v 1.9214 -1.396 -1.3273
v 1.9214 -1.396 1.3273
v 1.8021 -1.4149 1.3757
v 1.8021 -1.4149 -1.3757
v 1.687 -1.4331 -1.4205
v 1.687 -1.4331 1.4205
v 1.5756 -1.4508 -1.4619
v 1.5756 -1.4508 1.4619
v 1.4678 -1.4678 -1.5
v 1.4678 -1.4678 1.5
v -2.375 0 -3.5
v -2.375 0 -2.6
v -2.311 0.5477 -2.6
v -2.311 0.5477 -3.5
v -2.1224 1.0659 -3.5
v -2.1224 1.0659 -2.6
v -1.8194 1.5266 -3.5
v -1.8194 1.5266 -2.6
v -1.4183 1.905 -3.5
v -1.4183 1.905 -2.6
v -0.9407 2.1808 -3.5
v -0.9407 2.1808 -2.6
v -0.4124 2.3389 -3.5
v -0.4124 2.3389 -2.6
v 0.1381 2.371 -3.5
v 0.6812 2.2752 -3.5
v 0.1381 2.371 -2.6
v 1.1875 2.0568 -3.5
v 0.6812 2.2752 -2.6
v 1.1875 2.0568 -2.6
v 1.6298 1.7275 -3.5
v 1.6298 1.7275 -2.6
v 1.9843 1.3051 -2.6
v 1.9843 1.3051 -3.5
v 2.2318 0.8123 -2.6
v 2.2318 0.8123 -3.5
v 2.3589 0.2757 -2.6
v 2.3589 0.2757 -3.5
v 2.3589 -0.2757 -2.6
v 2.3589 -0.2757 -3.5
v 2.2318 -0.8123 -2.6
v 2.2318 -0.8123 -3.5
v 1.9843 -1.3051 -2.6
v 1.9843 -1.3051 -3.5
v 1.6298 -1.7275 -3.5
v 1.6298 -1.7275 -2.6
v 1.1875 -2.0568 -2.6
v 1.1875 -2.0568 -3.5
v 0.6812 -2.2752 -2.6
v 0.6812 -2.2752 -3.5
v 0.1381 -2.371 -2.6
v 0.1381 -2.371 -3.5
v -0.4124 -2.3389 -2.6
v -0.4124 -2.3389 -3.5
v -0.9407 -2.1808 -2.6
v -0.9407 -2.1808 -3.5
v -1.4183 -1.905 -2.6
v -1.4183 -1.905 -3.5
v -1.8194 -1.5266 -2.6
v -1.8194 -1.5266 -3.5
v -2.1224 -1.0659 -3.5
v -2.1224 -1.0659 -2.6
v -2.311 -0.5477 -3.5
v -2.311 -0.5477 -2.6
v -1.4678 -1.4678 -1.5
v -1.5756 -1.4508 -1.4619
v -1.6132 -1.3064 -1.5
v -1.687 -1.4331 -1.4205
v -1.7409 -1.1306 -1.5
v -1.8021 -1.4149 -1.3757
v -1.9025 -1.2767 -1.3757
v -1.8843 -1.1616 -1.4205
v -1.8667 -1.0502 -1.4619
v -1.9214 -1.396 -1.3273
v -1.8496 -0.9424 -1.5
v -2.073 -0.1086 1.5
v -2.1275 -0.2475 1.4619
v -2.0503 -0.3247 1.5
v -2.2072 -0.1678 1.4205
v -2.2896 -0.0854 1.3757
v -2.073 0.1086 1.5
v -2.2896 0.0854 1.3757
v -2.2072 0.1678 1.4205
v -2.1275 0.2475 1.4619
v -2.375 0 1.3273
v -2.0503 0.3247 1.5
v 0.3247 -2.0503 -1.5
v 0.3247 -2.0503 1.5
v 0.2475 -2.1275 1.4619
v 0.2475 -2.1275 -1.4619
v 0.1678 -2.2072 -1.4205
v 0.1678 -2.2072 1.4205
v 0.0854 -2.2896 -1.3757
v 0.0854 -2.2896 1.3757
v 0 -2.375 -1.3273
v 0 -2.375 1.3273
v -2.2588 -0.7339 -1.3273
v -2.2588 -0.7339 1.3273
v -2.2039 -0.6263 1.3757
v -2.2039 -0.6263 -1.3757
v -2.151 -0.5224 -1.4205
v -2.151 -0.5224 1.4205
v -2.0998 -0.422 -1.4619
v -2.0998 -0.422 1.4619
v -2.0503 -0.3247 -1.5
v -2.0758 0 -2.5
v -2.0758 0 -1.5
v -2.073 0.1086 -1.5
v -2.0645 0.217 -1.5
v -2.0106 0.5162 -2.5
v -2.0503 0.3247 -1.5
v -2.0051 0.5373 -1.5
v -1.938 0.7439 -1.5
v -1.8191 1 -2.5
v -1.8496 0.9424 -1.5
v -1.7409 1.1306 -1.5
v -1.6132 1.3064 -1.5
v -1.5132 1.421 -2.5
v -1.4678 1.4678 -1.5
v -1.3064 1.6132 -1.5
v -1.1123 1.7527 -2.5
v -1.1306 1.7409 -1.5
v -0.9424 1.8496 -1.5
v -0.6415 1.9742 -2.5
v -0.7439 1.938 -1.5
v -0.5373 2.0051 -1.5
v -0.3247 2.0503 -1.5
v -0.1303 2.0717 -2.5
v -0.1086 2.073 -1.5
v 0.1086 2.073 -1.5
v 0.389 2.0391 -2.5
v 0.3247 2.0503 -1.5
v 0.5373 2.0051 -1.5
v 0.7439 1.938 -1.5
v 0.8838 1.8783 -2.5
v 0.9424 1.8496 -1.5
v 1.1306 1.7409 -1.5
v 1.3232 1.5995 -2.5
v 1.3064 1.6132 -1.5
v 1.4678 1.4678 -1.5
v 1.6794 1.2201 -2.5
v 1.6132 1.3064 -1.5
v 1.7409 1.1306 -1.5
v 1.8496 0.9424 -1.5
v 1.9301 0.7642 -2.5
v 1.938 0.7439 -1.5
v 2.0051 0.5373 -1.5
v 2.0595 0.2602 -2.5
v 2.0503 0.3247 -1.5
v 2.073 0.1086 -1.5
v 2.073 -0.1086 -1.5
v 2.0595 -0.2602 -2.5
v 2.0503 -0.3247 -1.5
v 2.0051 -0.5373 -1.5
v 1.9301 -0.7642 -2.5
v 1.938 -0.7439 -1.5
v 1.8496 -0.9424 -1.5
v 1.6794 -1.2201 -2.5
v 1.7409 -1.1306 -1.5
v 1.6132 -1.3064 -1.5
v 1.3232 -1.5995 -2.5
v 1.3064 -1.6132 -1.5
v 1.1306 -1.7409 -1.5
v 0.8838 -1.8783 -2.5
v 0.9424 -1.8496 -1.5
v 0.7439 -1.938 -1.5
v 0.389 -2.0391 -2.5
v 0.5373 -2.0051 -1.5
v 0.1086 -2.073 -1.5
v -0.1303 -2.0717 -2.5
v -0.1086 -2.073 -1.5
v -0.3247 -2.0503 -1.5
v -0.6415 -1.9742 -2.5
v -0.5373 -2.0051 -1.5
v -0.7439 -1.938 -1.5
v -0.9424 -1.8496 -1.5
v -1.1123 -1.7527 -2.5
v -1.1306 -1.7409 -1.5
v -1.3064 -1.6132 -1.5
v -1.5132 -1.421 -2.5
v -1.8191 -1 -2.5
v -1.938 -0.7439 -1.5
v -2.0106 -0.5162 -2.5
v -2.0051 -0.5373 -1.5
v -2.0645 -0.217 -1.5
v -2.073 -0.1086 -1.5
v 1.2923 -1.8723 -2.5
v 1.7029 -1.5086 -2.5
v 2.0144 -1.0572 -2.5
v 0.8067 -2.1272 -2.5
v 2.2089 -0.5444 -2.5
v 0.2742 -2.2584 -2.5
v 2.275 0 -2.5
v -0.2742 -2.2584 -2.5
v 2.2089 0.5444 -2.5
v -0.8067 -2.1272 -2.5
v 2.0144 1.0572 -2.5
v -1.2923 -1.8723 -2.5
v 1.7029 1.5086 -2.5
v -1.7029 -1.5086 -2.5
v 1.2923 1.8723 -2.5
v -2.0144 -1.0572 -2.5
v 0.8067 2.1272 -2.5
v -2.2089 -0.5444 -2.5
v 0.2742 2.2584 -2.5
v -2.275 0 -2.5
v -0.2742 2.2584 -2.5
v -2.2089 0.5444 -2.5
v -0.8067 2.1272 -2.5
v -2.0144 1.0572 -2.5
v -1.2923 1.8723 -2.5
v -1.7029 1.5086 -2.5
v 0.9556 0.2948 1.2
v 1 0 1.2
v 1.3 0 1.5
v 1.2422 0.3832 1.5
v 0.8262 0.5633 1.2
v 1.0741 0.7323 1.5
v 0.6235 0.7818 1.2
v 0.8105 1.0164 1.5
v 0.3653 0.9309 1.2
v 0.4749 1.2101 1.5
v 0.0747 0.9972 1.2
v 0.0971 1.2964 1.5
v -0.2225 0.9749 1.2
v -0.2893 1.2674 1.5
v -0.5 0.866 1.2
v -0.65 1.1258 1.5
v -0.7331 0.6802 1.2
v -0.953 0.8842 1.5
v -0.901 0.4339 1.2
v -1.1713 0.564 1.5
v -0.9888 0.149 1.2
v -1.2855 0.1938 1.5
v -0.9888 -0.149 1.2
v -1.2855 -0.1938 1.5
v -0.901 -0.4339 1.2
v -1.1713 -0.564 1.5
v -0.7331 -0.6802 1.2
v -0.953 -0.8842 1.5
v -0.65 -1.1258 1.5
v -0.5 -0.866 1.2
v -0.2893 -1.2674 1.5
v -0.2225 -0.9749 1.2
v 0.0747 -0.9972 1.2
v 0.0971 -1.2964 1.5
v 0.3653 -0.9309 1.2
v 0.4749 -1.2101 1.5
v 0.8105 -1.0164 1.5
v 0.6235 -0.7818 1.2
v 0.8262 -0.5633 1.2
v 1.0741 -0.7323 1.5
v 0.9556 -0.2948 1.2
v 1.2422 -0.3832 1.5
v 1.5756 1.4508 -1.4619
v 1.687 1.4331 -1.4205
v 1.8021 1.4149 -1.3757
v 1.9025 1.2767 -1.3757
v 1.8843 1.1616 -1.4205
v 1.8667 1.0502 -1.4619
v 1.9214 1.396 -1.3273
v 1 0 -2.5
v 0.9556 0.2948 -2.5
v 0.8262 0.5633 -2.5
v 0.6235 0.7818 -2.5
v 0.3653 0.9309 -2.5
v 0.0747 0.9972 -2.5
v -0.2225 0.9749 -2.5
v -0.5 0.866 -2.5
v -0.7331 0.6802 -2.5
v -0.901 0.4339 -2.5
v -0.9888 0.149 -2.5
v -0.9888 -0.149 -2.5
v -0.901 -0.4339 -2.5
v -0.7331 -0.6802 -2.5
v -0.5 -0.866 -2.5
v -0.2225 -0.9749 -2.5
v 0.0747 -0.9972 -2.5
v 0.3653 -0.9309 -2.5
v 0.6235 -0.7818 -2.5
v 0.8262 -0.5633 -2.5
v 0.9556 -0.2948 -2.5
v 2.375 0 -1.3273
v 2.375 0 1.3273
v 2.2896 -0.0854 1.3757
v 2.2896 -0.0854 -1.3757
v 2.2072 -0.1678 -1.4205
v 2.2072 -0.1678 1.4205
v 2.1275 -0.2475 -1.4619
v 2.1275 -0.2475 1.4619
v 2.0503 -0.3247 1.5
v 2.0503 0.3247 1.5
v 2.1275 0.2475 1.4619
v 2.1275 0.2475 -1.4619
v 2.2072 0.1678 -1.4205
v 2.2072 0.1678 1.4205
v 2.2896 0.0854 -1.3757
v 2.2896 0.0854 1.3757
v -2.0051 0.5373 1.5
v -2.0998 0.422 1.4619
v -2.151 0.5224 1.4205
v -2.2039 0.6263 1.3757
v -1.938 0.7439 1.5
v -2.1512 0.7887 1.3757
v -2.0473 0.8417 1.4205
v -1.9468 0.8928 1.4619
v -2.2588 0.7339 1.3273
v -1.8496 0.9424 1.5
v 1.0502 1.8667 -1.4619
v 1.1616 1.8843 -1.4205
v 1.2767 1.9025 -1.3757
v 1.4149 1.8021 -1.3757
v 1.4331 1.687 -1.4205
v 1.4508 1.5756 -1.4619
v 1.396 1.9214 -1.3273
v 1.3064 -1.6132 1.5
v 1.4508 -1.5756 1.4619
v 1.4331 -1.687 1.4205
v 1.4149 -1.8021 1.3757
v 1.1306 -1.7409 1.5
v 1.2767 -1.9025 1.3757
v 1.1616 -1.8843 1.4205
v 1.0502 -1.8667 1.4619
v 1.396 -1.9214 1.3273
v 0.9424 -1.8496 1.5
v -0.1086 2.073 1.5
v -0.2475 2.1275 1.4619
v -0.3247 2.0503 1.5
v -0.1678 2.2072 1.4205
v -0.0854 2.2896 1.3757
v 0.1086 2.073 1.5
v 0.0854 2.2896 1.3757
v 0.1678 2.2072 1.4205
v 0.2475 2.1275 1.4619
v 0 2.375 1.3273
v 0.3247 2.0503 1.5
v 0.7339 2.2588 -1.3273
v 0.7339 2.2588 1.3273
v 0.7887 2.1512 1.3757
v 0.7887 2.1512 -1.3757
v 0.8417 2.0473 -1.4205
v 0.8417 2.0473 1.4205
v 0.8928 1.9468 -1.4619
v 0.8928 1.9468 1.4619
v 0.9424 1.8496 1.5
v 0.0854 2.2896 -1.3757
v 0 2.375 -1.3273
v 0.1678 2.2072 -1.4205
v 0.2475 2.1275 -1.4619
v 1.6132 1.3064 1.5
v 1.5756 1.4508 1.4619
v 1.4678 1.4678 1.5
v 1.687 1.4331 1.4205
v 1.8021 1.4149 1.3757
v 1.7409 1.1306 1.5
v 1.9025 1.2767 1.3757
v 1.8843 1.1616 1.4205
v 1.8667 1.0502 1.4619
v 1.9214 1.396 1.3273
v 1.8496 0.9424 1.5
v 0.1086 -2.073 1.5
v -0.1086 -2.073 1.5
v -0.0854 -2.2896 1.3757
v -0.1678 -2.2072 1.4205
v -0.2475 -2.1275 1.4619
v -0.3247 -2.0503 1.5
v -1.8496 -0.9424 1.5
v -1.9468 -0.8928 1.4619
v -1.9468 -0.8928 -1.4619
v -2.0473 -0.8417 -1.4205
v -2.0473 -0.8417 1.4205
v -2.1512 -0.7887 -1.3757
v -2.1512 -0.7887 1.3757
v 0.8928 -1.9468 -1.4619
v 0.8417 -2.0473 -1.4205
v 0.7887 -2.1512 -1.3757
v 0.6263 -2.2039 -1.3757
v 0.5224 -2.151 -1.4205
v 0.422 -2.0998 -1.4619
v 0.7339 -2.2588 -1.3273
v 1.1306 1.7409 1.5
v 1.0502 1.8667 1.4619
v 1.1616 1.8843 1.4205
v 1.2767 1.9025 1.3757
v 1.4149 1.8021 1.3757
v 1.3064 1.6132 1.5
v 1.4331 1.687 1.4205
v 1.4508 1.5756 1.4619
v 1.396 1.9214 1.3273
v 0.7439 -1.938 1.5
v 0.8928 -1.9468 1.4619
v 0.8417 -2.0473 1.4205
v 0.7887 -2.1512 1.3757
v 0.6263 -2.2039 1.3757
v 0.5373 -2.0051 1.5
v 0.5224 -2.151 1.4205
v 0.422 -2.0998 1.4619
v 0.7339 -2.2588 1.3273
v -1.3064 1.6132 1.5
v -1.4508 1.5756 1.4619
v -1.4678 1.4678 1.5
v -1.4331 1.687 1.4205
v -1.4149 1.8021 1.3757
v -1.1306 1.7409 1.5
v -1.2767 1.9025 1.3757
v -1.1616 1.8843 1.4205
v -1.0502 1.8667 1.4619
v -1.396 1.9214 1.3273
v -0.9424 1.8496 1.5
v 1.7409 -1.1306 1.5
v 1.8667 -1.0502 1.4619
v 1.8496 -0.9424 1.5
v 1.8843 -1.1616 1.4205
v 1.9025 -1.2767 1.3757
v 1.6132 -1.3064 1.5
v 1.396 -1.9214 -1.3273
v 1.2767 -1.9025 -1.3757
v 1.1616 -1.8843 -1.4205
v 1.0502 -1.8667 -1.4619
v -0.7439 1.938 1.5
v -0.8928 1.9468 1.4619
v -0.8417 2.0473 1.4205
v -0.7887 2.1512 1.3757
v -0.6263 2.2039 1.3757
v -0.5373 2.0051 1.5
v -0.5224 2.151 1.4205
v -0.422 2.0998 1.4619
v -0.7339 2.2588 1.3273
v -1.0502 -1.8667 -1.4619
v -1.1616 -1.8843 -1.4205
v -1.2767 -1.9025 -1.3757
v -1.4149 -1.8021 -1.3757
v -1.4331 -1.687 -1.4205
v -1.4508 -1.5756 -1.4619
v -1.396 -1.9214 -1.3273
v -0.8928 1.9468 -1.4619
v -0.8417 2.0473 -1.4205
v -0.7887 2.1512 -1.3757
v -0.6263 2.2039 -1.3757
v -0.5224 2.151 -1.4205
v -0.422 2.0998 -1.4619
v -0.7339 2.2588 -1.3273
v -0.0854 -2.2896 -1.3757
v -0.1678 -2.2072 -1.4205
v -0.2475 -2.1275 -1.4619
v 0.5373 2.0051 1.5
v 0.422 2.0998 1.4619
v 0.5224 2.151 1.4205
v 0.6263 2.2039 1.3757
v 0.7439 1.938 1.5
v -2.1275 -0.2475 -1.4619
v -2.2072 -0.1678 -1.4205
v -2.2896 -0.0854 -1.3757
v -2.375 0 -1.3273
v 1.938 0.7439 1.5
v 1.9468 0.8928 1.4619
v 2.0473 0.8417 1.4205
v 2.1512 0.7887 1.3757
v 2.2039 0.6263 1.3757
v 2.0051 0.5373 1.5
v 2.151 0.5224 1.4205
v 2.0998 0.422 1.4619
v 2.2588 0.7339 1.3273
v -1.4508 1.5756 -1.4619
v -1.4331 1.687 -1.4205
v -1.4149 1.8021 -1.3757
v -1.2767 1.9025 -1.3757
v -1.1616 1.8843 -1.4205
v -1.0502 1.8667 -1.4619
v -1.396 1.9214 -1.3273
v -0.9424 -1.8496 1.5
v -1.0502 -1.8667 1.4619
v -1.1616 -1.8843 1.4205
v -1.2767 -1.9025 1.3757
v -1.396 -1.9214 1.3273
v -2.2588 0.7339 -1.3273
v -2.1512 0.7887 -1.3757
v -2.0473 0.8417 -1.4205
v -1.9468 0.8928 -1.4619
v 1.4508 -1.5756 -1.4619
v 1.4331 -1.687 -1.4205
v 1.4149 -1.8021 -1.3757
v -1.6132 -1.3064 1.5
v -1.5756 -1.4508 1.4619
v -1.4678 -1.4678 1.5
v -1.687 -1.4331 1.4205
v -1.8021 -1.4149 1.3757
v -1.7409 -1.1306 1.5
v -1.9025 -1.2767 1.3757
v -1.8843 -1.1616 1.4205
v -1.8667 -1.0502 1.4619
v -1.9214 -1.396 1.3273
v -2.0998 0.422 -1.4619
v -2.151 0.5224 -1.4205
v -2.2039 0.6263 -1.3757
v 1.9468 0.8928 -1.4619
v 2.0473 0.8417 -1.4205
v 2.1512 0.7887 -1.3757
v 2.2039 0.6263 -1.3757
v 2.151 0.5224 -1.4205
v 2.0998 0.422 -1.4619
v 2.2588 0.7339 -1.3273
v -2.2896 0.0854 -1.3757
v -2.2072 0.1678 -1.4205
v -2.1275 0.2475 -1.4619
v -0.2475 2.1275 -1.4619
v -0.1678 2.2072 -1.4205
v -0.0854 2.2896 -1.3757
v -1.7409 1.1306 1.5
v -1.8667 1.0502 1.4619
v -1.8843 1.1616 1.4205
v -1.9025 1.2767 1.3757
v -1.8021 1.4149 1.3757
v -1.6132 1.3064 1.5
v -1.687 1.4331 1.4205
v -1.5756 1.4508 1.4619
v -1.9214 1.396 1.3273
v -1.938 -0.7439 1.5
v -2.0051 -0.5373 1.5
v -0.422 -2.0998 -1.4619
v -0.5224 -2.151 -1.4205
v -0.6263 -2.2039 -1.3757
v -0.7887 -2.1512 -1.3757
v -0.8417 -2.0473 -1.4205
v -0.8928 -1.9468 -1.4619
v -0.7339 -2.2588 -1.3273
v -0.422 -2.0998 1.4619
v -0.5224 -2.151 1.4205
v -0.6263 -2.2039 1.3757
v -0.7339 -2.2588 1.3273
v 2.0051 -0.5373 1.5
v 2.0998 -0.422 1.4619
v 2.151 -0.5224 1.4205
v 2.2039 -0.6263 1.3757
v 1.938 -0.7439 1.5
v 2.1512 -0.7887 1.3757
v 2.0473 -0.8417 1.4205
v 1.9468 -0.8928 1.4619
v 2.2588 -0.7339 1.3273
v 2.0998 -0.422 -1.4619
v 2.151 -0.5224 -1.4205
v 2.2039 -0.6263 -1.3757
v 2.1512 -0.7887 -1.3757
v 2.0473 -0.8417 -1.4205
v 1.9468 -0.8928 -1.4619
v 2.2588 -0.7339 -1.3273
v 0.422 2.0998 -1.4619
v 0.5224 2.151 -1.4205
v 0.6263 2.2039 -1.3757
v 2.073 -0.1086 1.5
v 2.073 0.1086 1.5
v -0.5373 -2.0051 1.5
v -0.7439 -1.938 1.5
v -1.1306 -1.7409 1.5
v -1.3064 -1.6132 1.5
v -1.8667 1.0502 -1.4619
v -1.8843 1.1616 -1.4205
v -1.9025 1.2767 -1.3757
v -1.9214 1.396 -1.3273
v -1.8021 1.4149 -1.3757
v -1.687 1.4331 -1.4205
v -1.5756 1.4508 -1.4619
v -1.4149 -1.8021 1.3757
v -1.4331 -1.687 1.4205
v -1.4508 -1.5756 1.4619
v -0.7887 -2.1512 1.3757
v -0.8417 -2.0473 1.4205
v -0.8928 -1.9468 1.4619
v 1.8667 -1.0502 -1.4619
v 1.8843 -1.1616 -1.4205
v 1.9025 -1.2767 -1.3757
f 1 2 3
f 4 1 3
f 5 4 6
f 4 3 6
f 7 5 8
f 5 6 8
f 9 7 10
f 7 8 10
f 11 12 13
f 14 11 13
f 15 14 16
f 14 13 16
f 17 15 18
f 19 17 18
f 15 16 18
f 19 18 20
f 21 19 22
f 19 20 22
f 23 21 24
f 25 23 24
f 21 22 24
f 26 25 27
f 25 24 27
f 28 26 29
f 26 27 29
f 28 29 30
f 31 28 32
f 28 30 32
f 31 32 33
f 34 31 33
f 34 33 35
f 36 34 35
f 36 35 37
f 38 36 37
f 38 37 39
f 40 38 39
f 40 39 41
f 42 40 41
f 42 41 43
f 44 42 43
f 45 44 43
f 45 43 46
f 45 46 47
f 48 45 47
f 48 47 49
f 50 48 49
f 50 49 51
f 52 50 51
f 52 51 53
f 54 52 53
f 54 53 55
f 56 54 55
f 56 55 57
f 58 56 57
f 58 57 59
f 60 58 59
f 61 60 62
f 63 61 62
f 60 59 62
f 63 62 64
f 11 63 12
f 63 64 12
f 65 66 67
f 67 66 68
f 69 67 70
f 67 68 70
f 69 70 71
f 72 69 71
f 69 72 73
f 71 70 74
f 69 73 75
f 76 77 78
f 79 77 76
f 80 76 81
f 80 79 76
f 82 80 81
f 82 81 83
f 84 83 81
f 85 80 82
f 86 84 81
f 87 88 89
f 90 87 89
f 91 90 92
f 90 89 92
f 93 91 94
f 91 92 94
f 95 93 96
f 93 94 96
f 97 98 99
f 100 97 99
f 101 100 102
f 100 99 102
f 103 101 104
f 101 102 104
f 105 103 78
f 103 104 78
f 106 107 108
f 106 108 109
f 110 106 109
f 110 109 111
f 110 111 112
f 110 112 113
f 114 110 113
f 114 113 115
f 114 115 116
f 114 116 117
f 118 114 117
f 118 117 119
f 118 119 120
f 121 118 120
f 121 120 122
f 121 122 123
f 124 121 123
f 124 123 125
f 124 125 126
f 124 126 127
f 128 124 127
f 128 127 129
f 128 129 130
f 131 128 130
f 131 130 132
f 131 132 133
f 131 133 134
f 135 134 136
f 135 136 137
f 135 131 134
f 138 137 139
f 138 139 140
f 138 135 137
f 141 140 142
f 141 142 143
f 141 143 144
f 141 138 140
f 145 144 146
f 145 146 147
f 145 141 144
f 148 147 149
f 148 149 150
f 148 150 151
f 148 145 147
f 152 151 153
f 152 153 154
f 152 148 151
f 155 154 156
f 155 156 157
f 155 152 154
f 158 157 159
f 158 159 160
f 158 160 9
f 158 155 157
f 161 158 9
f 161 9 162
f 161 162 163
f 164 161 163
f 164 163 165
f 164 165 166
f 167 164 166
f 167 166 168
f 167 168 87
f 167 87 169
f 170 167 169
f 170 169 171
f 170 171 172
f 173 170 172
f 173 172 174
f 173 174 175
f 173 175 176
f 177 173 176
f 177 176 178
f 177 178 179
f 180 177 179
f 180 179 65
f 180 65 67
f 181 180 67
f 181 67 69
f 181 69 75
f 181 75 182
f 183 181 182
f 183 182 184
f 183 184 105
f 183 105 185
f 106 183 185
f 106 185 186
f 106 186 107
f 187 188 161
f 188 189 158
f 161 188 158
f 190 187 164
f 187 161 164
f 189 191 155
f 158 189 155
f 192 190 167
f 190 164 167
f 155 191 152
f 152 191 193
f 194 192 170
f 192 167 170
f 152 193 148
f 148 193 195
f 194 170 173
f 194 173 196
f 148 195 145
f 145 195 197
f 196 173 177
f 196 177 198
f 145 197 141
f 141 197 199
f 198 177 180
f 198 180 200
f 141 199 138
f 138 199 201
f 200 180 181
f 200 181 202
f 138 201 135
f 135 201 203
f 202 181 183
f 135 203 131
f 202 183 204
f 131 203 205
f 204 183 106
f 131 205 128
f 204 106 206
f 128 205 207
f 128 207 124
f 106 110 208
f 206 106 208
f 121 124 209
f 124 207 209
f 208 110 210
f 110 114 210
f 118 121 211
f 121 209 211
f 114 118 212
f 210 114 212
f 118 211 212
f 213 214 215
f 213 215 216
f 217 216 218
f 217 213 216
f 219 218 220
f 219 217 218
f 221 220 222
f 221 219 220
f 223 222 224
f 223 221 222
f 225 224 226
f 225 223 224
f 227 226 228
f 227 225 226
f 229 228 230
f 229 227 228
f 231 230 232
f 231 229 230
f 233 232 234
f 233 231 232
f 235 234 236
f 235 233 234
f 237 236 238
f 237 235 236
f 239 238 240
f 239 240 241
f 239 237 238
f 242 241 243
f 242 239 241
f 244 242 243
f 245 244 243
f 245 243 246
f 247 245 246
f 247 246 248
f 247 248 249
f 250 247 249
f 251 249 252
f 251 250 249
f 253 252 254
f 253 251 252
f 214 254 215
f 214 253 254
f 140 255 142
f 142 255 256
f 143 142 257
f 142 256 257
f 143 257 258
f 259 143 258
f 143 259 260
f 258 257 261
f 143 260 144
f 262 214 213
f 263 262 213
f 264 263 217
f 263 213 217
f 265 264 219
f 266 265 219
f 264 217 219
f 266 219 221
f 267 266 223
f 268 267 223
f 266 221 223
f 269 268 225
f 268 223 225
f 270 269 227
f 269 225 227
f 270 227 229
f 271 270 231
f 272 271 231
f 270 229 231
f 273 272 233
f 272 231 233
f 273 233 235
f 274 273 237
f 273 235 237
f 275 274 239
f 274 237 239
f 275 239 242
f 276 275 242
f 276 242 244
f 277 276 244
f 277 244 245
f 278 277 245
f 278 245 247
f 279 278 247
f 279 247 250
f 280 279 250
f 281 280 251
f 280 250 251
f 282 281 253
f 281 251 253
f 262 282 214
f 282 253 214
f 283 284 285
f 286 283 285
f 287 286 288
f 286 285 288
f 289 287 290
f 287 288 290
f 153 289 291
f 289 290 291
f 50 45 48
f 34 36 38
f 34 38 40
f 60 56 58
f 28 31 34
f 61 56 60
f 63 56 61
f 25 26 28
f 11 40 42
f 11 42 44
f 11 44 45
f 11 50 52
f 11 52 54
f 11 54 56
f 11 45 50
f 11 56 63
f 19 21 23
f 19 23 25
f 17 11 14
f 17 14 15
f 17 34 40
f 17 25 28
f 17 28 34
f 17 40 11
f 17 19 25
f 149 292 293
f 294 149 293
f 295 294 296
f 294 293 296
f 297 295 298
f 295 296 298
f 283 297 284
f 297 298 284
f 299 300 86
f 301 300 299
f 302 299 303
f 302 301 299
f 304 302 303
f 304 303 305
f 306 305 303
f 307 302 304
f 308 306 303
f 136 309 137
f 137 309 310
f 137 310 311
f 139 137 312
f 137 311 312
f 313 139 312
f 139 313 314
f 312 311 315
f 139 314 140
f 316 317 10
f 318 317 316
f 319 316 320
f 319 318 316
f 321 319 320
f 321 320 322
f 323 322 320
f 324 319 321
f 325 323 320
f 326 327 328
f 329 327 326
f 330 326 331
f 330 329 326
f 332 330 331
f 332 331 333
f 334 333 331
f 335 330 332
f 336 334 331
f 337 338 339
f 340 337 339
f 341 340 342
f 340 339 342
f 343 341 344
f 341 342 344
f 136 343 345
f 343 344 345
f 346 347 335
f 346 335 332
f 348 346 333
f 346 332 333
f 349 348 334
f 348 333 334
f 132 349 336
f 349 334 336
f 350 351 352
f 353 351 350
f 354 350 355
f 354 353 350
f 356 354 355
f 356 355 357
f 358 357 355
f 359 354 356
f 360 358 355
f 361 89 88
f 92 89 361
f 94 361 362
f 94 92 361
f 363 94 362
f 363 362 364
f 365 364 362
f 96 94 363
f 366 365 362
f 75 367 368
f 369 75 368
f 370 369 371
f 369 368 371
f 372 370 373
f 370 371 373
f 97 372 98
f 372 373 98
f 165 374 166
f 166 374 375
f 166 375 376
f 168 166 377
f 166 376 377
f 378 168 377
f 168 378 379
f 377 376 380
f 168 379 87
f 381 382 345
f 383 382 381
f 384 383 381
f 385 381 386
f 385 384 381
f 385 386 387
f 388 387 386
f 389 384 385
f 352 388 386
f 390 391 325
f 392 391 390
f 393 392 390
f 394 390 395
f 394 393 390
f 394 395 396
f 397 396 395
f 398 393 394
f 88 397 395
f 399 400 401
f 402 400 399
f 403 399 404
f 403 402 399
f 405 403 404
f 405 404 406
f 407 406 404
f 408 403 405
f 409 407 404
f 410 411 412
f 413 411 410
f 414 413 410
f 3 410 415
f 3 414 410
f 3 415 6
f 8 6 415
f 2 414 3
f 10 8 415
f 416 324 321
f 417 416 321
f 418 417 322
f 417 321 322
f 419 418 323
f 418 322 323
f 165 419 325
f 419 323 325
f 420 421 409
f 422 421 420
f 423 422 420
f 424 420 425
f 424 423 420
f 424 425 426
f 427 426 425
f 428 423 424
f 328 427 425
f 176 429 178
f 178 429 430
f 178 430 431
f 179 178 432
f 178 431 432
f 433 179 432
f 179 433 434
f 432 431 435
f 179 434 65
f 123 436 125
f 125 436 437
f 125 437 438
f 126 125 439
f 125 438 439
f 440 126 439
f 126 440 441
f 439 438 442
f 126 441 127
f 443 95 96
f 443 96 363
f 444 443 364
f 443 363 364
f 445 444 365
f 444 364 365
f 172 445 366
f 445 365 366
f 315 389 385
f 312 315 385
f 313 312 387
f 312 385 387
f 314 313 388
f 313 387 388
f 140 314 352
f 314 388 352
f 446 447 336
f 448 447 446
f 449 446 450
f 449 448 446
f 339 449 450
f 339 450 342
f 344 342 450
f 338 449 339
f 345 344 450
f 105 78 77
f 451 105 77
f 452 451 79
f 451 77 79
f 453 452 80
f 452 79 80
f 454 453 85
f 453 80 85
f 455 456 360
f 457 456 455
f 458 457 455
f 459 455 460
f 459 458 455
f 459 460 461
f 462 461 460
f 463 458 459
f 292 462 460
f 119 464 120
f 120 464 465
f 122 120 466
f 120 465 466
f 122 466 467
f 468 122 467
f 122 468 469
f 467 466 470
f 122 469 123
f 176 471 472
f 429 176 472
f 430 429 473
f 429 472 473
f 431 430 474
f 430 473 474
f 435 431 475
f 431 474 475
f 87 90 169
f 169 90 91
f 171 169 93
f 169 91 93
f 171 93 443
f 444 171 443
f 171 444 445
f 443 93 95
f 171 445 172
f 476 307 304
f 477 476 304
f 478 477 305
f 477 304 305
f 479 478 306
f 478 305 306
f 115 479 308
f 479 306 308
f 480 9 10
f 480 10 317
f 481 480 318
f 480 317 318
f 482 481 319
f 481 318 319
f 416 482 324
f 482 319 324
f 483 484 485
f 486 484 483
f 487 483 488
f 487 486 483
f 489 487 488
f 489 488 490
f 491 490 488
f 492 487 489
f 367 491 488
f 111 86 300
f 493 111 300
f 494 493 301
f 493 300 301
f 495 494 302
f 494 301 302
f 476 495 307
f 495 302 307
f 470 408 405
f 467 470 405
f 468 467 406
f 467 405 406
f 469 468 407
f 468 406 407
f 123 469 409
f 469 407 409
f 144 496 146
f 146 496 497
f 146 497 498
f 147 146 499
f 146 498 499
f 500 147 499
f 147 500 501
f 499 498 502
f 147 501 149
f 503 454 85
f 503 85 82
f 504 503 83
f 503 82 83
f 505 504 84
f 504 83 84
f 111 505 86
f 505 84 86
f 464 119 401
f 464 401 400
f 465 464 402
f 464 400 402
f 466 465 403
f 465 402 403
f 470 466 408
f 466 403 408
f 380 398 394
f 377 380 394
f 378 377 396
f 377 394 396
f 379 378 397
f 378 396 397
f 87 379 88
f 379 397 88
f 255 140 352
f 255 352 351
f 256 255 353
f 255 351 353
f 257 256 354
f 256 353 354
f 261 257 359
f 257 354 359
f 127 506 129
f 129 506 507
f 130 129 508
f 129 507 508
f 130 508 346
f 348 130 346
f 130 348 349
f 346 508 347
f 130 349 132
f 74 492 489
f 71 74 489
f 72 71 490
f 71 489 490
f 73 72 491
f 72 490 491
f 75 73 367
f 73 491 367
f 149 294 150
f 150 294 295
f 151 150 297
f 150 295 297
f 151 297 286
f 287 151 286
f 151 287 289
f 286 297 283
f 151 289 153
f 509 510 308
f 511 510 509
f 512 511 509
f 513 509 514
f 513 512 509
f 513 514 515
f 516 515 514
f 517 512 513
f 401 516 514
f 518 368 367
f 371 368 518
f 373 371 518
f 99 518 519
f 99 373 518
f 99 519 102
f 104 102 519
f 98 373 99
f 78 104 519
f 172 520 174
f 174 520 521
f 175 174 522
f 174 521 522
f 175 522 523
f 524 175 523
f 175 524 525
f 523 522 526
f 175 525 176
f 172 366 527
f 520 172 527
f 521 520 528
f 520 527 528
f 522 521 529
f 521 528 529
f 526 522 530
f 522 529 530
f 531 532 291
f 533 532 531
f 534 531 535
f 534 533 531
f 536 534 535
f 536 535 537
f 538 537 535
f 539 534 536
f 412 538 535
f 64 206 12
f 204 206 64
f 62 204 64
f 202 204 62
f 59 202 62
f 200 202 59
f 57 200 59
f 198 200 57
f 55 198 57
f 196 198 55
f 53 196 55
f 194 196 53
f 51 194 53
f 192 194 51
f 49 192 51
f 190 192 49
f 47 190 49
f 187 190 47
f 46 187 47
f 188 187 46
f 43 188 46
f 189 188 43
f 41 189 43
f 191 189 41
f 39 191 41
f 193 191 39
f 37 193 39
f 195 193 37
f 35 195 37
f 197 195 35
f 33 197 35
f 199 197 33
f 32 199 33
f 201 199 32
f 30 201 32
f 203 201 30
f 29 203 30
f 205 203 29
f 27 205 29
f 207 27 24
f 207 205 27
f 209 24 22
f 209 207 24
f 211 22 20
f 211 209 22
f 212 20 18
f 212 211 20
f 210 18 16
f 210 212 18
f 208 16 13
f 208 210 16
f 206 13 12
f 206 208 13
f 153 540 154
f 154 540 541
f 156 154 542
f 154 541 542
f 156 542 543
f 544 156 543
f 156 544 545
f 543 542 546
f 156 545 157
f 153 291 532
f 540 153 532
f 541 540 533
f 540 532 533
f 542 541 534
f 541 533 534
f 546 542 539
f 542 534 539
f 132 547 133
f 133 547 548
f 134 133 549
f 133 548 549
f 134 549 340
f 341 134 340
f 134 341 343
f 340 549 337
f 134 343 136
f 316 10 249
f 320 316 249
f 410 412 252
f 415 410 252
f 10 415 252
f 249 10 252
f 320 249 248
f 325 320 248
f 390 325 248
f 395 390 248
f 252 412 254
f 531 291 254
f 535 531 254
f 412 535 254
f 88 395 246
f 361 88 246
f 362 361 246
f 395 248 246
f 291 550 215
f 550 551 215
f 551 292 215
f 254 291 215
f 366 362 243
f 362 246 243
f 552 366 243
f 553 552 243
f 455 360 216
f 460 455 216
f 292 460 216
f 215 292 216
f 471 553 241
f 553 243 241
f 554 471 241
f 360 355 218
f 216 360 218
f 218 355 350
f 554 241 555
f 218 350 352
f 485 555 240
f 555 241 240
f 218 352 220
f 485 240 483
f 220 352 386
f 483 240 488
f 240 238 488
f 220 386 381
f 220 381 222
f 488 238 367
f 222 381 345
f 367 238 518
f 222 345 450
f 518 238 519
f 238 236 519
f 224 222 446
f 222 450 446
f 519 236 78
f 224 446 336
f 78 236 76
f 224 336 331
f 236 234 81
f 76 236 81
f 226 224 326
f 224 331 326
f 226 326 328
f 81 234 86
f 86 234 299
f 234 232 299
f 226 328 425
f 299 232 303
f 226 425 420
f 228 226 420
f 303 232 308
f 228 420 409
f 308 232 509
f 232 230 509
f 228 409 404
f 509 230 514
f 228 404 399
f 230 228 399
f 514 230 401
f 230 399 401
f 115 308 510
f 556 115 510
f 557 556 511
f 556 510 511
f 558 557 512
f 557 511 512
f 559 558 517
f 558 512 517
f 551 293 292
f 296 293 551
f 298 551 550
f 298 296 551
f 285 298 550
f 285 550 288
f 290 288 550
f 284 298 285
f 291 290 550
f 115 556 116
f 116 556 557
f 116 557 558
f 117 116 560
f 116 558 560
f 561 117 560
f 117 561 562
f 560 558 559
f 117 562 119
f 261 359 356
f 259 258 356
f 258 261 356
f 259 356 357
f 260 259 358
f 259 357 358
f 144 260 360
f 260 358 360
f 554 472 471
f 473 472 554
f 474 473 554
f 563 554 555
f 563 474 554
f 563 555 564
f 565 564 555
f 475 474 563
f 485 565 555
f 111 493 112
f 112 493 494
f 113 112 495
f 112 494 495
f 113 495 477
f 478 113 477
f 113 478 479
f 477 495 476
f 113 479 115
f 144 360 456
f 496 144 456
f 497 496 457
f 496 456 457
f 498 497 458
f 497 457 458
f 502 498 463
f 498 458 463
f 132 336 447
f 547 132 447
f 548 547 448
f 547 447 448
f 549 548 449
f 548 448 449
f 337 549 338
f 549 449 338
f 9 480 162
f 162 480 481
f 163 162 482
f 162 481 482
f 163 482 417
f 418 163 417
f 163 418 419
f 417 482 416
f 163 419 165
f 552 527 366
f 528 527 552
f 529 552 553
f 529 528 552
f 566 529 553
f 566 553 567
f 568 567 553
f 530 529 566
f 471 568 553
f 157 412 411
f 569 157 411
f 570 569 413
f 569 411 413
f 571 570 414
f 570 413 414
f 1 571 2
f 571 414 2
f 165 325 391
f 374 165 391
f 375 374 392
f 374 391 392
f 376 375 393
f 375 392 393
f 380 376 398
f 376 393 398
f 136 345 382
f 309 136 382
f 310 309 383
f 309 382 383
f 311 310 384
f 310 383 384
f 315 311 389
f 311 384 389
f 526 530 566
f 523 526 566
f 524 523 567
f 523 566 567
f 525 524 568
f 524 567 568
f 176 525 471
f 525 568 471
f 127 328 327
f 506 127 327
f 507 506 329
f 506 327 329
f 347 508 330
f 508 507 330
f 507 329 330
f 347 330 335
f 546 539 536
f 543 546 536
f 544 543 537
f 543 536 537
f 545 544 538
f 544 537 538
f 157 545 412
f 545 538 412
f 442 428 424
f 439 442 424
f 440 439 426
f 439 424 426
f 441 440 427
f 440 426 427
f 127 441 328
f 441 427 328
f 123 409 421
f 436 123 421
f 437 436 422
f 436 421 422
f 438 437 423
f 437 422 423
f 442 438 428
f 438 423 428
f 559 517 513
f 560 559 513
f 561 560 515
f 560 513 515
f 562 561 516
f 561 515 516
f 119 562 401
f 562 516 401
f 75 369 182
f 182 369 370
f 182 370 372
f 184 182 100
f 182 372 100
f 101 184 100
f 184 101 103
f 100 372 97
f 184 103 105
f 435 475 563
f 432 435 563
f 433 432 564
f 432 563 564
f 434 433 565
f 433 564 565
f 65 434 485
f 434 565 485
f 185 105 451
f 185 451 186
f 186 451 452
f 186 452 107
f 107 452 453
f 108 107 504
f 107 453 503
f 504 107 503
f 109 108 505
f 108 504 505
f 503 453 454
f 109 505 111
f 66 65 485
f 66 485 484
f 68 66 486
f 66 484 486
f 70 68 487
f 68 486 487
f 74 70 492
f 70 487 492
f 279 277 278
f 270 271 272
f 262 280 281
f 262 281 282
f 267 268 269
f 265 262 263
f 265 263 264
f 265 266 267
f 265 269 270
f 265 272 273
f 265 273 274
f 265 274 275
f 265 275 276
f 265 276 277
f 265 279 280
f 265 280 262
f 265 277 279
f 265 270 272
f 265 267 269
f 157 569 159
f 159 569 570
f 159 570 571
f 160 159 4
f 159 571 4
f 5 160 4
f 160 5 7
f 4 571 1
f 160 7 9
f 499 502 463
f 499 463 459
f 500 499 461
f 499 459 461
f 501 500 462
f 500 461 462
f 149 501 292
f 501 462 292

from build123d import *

# Parameters (mm, degrees)
BOSS_EXTRUDE1_DEPTH = 1.5
SKETCH2_OUTSIDE_W   = 18.614
SKETCH2_OUTSIDE_H   = 18.614
SKETCH2_OUTSIDE_R   = 2.075826116
CUT_EXTRUDE1_DEPTH  = 3
CUT_EXTRUDE1_TAPER  = 60
SKETCH3_R           = 2.375
BOSS_EXTRUDE2_DEPTH = 2
CUT_EXTRUDE3_START  = -1
SKETCH5_OUTSIDE_W   = 8.424
SKETCH5_OUTSIDE_H   = 8.424
SKETCH5_OUTSIDE_R   = 2.075826116
CUT_EXTRUDE3_DEPTH  = 1
CHAMFER1_SIZE       = 0.1
SKETCH6_R           = 1
CUT_EXTRUDE4_DEPTH  = 4
CHAMFER2_SIZE       = 0.3


with BuildPart() as part:
    # Sketch1 → Boss-Extrude1 (new body, symmetric)
    with BuildSketch(Plane.XY):
        Polygon((-0.324730748, 2.050269252), (0, 2.375), (0.324730748, 2.050269252), (0.733915362, 2.258759226), (0.942405336, 1.849574613), (1.395989974, 1.921415362), (1.467830723, 1.467830723), (1.921415362, 1.395989974), (1.849574613, 0.942405336), (2.258759226, 0.733915362), (2.050269252, 0.324730748), (2.375, 0), (2.050269252, -0.324730748), (2.258759226, -0.733915362), (1.849574613, -0.942405336), (1.921415362, -1.395989974), (1.467830723, -1.467830723), (1.395989974, -1.921415362), (0.942405336, -1.849574613), (0.733915362, -2.258759226), (0.324730748, -2.050269252), (0, -2.375), (-0.324730748, -2.050269252), (-0.733915362, -2.258759226), (-0.942405336, -1.849574613), (-1.395989974, -1.921415362), (-1.467830723, -1.467830723), (-1.921415362, -1.395989974), (-1.849574613, -0.942405336), (-2.258759226, -0.733915362), (-2.050269252, -0.324730748), (-2.375, 0), (-2.050269252, 0.324730748), (-2.258759226, 0.733915362), (-1.849574613, 0.942405336), (-1.921415362, 1.395989974), (-1.467830723, 1.467830723), (-1.395989974, 1.921415362), (-0.942405336, 1.849574613), (-0.733915362, 2.258759226), align=None)
    extrude(amount=BOSS_EXTRUDE1_DEPTH, both=True)

    # Sketch2 outside → Cut-Extrude1 (cut)
    with BuildSketch(Plane.XY.offset(1.5)):
        Rectangle(SKETCH2_OUTSIDE_W, SKETCH2_OUTSIDE_H)
        Circle(SKETCH2_OUTSIDE_R, mode=Mode.SUBTRACT)
    cut_extrude1 = extrude(amount=-CUT_EXTRUDE1_DEPTH, taper=CUT_EXTRUDE1_TAPER, mode=Mode.SUBTRACT)

    # Mirror1: Cut-Extrude1 across plane
    add(cut_extrude1.mirror(Plane.XY), mode=Mode.SUBTRACT)

    # Sketch3 → Boss-Extrude2 (add)
    with BuildSketch(Plane(origin=(0, 0, -1.5), x_dir=(-1, 0, 0), z_dir=(0, 0, -1))):
        Circle(SKETCH3_R)
    extrude(amount=BOSS_EXTRUDE2_DEPTH)

    # Sketch5 outside → Cut-Extrude3 (cut)
    with BuildSketch(Plane(origin=(0, 0, -3.5), x_dir=(-1, 0, 0), z_dir=(0, 0, -1)).offset(CUT_EXTRUDE3_START)):
        Rectangle(SKETCH5_OUTSIDE_W, SKETCH5_OUTSIDE_H)
        Circle(SKETCH5_OUTSIDE_R, mode=Mode.SUBTRACT)
    extrude(amount=-CUT_EXTRUDE3_DEPTH, mode=Mode.SUBTRACT)

    # Chamfer1
    chamfer1_edges = [part.edges().sort_by_distance(p)[0] for p in [
        (2.375, 0, -2.5),
    ]]
    chamfer(chamfer1_edges, length=CHAMFER1_SIZE)

    # Sketch6 → Cut-Extrude4 (cut)
    with BuildSketch(Plane.XY.offset(1.5)):
        Circle(SKETCH6_R)
    extrude(amount=-CUT_EXTRUDE4_DEPTH, mode=Mode.SUBTRACT)

    # Chamfer2
    chamfer2_edges = [part.edges().sort_by_distance(p)[0] for p in [
        (-1, 0, 1.5),
    ]]
    chamfer(chamfer2_edges, length=CHAMFER2_SIZE)


solid = part.part
